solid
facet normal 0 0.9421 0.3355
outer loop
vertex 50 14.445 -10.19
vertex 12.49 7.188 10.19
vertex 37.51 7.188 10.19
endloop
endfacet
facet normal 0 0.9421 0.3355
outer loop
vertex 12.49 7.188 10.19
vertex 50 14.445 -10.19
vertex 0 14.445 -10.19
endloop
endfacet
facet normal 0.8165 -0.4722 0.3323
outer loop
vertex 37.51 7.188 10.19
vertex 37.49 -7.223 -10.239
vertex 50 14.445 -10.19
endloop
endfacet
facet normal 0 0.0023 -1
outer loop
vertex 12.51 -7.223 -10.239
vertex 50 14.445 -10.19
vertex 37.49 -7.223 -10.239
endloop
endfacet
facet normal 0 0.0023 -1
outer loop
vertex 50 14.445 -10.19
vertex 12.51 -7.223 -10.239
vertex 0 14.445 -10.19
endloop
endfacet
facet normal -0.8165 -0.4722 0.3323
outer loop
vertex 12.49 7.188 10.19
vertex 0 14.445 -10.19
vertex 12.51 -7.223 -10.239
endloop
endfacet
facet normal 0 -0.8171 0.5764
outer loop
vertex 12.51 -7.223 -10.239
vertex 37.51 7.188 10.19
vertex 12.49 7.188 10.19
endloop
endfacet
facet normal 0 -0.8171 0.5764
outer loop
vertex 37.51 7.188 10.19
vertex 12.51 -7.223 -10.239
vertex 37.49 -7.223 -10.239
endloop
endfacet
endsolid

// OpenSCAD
//size of the pyramid (mm)
r = 50;

/* [Hidden] */
alpha = 54.8;

module puzzle (r=10){
    
difference() {
translate ([0,0,-r/(2*sqrt(2))])rotate ([alpha,0,0])pyramid(r);
  translate ([0,0,5*r]) cube([20*r,20*r,10*r], center = true);
}
}

module pyramid(side=50 ){

	
	
	{
		
			polyhedron (	points = [[0,0,0],[side,0,0],[side/2,sqrt(3)*side/2,0],
								[side/2,sqrt(3)*side/6,sqrt(6)/3*side]], 
						faces = [[0,1,2], [1,0,3], [2,1,3],[2,3,0]]);			
		
}	}

color("green")rotate([alpha,0,0]) puzzle(r);
*color("red") translate ([r/2,r/3.7,r/2.40])rotate([0,35,90]) rotate([0,90,0]) puzzle(r);

